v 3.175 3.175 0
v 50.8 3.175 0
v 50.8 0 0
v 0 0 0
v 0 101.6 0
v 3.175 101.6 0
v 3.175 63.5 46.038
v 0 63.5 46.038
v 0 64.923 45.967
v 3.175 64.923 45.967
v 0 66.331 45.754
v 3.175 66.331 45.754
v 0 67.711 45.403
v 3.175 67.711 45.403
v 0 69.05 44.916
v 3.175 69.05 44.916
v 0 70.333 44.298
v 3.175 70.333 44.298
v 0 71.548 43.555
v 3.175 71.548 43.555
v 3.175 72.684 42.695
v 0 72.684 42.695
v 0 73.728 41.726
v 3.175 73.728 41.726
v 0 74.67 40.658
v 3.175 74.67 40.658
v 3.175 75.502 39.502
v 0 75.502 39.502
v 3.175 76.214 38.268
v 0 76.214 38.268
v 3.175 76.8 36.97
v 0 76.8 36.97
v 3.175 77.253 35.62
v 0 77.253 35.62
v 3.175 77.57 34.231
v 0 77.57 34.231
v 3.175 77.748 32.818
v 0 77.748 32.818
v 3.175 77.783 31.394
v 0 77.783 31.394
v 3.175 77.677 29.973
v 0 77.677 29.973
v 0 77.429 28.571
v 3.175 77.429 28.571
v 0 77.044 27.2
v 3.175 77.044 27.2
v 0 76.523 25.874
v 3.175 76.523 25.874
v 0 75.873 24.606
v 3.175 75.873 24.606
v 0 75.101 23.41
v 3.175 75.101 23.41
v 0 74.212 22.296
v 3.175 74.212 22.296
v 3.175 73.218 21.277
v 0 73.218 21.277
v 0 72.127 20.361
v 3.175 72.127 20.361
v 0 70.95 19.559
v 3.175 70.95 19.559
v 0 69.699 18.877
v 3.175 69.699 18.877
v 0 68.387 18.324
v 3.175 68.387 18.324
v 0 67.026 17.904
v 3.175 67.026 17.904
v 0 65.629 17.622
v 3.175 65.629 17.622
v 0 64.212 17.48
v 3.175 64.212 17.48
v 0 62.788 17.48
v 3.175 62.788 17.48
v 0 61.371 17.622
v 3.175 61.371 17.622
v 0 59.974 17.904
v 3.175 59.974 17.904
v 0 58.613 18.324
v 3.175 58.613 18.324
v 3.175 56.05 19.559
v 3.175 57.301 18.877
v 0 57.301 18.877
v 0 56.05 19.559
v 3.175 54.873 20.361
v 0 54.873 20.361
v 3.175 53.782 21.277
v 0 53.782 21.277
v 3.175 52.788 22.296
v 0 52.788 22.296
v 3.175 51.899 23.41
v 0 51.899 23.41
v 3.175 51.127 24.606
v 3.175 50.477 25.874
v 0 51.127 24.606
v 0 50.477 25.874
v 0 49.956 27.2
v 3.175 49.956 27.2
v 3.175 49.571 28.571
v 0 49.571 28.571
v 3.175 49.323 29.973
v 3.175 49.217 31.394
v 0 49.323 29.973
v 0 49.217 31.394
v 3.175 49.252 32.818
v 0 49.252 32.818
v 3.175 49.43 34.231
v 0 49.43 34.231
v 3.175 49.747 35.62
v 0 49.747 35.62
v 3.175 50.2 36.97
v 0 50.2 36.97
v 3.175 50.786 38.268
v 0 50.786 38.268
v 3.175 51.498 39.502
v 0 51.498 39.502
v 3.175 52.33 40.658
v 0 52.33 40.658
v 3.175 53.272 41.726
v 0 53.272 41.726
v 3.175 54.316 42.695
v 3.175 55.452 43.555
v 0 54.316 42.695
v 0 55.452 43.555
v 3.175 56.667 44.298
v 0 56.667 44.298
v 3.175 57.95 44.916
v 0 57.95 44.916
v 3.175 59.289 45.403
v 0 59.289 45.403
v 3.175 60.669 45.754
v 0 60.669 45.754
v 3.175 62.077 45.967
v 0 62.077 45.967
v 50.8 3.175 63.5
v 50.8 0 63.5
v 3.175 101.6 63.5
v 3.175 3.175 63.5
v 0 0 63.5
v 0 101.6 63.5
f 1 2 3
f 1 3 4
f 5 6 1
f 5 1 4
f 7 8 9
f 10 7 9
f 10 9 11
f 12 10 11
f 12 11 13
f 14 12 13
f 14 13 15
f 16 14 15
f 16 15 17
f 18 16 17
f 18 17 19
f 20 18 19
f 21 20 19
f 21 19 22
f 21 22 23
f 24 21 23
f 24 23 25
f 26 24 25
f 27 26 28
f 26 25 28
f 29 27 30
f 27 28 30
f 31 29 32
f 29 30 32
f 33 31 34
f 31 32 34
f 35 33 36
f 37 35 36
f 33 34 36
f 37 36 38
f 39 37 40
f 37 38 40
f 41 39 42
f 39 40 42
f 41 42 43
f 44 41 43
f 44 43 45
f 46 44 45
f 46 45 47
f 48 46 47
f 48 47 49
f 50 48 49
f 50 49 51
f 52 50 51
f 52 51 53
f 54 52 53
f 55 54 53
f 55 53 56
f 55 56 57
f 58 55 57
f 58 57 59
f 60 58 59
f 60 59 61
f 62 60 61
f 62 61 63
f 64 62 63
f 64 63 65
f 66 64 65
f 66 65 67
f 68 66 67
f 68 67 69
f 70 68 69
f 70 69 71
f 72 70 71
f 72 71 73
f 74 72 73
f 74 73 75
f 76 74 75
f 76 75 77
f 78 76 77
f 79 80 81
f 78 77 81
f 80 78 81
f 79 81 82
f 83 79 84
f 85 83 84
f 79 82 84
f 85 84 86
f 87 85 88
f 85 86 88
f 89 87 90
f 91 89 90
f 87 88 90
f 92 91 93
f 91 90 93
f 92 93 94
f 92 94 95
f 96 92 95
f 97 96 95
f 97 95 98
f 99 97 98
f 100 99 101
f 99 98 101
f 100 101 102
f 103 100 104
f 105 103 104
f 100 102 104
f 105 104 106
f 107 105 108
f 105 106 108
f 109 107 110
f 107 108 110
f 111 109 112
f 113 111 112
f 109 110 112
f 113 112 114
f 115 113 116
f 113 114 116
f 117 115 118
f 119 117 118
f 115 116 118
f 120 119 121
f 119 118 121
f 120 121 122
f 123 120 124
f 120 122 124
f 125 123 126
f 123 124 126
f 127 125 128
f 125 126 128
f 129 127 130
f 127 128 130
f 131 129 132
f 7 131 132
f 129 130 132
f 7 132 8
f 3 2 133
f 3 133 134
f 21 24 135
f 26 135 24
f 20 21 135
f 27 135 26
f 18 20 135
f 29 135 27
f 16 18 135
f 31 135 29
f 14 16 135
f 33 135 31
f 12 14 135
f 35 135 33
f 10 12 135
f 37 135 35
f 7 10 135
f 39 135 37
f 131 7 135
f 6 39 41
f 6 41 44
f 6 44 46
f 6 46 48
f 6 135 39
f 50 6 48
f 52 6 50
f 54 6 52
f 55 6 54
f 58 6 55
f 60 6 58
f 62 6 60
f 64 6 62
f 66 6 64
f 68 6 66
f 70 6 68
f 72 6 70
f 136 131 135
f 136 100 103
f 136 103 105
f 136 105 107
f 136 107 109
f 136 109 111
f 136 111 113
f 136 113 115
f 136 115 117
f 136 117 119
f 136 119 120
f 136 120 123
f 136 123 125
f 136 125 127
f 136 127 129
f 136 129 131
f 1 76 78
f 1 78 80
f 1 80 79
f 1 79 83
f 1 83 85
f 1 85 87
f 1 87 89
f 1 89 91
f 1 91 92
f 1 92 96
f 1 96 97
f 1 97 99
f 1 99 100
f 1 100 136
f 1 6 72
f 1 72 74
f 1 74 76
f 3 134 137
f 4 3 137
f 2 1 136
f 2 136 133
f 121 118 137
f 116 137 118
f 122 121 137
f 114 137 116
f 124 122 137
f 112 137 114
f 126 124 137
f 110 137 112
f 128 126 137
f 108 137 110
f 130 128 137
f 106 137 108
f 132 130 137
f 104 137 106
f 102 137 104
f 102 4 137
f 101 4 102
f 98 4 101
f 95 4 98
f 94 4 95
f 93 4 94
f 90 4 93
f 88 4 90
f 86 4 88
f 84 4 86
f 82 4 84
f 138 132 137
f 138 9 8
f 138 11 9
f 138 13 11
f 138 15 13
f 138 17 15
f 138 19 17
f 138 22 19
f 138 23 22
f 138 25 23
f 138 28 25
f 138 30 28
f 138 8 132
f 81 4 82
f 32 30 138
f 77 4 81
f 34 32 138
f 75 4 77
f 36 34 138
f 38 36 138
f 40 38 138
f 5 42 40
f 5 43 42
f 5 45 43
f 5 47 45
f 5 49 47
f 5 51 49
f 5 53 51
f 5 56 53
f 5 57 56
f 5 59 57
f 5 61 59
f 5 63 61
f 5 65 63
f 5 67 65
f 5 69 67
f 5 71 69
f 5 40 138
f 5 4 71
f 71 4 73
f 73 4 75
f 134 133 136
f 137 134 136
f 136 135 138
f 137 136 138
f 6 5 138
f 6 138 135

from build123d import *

# Parameters (mm, degrees)
BOSS_EXTRUDE1_DEPTH = 63.5
SKETCH2_R           = 14.2875
CUT_EXTRUDE1_DEPTH  = 51.8


with BuildPart() as part:
    # Sketch1 → Boss-Extrude1 (new body)
    with BuildSketch(Plane.XY):
        Polygon((0, 0), (0, 101.6), (3.175, 101.6), (3.175, 3.175), (50.8, 3.175), (50.8, 0), align=None)
    extrude(amount=BOSS_EXTRUDE1_DEPTH)

    # Sketch2 → Cut-Extrude1 (cut, through all)
    with BuildSketch(Plane.ZY):
        with Locations((31.75, 63.5)):
            Circle(SKETCH2_R)
    extrude(amount=-CUT_EXTRUDE1_DEPTH, mode=Mode.SUBTRACT)


solid = part.part
